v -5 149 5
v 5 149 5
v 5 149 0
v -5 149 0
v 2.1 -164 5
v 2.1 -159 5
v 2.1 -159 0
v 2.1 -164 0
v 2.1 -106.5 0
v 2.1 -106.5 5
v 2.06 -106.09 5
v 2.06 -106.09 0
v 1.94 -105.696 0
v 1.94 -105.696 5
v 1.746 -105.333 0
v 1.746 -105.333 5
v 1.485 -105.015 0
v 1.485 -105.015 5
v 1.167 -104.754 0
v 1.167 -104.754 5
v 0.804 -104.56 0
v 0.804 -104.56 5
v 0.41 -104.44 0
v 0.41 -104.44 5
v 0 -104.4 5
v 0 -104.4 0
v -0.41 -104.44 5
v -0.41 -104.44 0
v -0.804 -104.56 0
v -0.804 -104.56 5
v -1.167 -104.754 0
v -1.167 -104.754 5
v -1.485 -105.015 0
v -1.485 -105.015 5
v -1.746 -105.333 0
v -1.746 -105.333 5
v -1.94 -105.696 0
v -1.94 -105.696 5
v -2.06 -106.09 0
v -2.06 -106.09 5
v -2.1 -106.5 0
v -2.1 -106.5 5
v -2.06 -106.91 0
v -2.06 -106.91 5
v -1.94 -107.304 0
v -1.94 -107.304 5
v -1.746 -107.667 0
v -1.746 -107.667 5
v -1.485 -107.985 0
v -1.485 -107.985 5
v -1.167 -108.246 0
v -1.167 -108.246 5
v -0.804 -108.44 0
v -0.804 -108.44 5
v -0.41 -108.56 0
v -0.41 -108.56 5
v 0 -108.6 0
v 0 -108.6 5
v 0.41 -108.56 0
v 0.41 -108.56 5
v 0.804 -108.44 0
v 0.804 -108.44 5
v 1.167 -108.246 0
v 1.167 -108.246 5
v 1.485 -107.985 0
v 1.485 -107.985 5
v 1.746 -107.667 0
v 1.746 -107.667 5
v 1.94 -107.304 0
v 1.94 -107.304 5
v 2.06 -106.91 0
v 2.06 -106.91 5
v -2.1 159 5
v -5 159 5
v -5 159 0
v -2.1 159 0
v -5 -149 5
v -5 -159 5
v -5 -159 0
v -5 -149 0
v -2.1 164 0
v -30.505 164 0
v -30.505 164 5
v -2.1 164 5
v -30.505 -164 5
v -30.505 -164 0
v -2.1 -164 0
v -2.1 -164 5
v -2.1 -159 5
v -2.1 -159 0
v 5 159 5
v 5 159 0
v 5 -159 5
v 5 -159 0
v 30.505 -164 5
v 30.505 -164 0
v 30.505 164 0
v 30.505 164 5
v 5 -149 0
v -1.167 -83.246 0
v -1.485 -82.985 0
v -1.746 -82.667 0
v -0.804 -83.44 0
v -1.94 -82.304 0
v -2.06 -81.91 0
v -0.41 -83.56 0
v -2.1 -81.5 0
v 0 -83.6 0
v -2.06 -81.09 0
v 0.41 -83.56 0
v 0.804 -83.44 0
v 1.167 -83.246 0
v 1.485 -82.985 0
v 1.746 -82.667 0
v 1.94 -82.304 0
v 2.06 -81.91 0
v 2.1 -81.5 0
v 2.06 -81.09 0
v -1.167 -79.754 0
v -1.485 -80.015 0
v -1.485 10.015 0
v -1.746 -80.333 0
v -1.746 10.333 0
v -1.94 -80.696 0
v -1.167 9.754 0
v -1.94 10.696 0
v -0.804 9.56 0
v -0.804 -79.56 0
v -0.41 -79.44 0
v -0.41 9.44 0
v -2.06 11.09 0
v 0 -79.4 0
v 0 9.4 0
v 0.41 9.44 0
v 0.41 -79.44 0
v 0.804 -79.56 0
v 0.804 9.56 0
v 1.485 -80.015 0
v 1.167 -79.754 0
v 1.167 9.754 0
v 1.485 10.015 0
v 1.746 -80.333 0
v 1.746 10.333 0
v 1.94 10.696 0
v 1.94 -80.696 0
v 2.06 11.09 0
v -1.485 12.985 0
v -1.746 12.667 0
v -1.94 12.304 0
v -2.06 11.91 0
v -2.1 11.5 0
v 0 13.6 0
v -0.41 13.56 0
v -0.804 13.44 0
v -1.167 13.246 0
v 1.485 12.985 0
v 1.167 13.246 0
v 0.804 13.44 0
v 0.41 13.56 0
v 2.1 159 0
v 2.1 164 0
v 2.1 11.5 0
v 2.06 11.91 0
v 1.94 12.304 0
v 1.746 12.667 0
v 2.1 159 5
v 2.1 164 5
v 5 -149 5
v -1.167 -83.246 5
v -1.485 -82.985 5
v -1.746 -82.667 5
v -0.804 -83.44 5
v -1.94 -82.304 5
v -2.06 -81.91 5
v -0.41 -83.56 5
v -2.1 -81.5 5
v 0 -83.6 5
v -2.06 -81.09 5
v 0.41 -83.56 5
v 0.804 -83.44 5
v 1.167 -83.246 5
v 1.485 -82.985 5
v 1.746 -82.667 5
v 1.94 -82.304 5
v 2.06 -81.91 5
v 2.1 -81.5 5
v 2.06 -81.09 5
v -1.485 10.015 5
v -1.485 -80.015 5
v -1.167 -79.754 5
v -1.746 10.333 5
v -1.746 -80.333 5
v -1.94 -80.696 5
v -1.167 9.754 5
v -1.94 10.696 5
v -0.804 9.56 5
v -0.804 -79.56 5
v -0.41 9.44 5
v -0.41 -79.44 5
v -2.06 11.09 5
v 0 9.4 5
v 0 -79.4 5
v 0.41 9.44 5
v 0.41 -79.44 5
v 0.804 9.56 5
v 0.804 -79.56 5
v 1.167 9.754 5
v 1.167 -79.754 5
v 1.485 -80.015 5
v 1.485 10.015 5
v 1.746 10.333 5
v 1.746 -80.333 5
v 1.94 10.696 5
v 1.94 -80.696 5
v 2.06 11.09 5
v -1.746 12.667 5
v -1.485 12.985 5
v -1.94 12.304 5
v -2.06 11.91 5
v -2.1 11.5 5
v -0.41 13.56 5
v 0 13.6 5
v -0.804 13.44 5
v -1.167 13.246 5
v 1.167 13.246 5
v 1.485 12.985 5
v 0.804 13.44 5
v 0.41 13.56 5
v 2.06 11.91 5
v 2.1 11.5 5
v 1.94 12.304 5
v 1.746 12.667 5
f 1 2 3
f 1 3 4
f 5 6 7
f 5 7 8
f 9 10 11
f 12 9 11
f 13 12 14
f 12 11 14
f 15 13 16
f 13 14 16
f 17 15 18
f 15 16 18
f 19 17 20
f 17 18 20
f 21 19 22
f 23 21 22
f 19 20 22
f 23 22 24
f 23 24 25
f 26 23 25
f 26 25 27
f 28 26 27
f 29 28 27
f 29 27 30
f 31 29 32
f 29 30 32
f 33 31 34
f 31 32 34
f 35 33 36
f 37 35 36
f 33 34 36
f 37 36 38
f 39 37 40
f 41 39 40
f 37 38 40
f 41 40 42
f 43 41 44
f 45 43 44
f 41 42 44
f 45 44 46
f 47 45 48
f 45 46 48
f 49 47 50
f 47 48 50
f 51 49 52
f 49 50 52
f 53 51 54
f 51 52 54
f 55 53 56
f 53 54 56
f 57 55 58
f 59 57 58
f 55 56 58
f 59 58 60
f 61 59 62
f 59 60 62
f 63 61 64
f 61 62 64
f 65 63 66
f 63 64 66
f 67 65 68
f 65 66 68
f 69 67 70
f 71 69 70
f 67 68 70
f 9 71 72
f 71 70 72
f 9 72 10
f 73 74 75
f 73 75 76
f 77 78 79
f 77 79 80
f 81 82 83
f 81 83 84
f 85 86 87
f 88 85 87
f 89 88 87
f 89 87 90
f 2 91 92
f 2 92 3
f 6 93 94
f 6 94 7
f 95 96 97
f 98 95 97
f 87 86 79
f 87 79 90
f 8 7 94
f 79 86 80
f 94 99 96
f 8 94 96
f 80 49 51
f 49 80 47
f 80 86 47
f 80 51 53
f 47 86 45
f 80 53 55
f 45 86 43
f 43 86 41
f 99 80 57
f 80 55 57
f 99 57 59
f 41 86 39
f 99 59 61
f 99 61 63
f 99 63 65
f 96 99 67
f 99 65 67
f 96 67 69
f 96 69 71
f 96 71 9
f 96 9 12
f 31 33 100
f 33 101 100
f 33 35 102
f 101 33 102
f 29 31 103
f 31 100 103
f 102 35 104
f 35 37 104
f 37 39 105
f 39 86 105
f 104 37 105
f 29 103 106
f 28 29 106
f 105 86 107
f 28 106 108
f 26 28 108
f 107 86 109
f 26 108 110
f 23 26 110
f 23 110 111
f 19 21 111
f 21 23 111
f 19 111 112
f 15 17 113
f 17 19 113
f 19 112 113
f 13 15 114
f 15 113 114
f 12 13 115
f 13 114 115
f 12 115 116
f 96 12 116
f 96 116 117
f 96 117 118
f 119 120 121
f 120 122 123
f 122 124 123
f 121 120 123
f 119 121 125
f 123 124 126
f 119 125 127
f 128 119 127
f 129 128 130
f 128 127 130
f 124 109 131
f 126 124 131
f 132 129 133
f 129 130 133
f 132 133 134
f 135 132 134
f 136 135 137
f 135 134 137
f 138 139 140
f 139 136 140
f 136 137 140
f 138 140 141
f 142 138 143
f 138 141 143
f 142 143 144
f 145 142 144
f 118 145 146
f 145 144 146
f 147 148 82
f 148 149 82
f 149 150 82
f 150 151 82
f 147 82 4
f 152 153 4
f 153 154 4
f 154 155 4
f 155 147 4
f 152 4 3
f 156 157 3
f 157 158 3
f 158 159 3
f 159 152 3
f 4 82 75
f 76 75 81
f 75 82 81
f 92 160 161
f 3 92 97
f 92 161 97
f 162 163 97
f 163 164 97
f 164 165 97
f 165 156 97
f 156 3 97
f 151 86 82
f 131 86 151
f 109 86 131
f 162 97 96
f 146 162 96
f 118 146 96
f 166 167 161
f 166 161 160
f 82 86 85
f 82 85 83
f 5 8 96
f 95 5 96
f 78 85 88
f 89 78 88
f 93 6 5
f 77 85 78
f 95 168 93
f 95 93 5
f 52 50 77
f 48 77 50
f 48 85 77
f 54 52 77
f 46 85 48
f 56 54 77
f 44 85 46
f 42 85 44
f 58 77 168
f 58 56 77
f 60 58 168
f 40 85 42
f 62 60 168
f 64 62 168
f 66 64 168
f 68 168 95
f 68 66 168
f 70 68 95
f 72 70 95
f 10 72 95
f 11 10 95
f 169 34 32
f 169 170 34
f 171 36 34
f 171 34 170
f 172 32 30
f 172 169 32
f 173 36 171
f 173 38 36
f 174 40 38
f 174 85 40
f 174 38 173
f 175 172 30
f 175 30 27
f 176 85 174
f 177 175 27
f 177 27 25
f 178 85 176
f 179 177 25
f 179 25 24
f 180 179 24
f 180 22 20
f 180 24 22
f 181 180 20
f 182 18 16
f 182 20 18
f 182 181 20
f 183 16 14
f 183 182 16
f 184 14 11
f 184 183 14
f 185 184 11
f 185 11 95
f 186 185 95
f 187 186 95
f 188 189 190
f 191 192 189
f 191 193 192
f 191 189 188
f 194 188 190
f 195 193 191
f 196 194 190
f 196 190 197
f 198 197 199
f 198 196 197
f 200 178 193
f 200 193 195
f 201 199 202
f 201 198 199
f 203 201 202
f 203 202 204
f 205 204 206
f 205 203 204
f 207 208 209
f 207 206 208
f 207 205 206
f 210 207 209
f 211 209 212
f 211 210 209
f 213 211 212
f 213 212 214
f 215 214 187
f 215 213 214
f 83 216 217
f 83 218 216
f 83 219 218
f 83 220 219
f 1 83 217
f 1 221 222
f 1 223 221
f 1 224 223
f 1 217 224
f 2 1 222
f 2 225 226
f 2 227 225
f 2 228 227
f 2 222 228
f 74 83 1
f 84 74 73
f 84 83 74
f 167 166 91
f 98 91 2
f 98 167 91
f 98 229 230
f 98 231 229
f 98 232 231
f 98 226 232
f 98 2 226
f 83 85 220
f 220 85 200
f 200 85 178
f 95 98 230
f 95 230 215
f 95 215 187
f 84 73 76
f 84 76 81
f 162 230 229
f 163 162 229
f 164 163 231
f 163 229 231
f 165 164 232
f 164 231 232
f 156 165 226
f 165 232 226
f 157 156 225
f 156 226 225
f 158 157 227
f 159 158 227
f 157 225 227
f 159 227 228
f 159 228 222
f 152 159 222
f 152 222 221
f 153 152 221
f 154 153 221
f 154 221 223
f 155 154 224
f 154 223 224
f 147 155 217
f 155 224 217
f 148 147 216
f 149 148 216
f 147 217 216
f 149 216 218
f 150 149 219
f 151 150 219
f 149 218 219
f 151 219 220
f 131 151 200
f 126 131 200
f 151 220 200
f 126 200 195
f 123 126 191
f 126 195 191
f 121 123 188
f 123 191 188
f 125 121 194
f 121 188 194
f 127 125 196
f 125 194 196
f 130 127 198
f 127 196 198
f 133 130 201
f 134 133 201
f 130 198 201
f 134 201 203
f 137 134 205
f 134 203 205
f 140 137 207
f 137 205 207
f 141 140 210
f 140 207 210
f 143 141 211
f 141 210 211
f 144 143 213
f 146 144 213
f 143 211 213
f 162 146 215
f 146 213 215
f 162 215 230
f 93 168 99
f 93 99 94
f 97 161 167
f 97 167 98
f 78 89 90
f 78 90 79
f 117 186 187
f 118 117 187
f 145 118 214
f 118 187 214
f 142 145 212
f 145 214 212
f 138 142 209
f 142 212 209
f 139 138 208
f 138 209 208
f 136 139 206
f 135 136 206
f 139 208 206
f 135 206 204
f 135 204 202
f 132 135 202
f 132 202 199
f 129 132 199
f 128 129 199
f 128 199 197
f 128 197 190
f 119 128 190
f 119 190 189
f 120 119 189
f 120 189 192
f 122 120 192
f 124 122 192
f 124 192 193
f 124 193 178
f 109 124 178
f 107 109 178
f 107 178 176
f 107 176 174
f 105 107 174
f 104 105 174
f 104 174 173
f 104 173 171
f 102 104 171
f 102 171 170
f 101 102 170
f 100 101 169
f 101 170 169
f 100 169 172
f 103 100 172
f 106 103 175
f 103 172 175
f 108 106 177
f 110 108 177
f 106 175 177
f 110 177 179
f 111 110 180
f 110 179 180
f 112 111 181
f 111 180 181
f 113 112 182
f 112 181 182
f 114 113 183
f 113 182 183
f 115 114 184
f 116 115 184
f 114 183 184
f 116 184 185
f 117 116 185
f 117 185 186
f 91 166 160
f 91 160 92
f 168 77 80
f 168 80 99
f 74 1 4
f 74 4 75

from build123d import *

# Parameters (mm, degrees)
SKETCH1_W           = 61.01
SKETCH1_H           = 328
BOSS_EXTRUDE1_DEPTH = 5
SKETCH2_R           = 2.1
CUT_EXTRUDE1_DEPTH  = 10
CUT_EXTRUDE2_DEPTH  = 10
SKETCH4_R           = 2.1
CUT_EXTRUDE3_DEPTH  = 5
SKETCH5_R           = 2.1
CUT_EXTRUDE4_DEPTH  = 5


with BuildPart() as part:
    # Sketch1 → Boss-Extrude1 (new body)
    with BuildSketch(Plane.XY):
        Rectangle(SKETCH1_W, SKETCH1_H)
    extrude(amount=BOSS_EXTRUDE1_DEPTH)

    # Sketch2 → Cut-Extrude1 (cut)
    with BuildSketch(Plane.XY.offset(5)):
        with Locations((0, -81.5)):
            Circle(SKETCH2_R)
    extrude(amount=-CUT_EXTRUDE1_DEPTH, mode=Mode.SUBTRACT)

    # Sketch3 → Cut-Extrude2 (cut)
    with BuildSketch(Plane.XY.offset(5)):
        Polygon((-2.1, -164), (-2.1, -159), (-5, -159), (-5, -149), (5, -149), (5, -159), (2.1, -159), (2.1, -164), align=None)
        Polygon((2.1, 164), (2.1, 159), (5, 159), (5, 149), (-5, 149), (-5, 159), (-2.1, 159), (-2.1, 164), align=None)
    extrude(amount=-CUT_EXTRUDE2_DEPTH, mode=Mode.SUBTRACT)

    # Sketch4 → Cut-Extrude3 (cut)
    with BuildSketch(Plane.XY.offset(5)):
        with Locations((0, -106.5)):
            Circle(SKETCH4_R)
    extrude(amount=-CUT_EXTRUDE3_DEPTH, mode=Mode.SUBTRACT)

    # Sketch5 → Cut-Extrude4 (cut)
    with BuildSketch(Plane.XY.offset(5)):
        with Locations((0, 11.5)):
            Circle(SKETCH5_R)
    extrude(amount=-CUT_EXTRUDE4_DEPTH, mode=Mode.SUBTRACT)


solid = part.part
